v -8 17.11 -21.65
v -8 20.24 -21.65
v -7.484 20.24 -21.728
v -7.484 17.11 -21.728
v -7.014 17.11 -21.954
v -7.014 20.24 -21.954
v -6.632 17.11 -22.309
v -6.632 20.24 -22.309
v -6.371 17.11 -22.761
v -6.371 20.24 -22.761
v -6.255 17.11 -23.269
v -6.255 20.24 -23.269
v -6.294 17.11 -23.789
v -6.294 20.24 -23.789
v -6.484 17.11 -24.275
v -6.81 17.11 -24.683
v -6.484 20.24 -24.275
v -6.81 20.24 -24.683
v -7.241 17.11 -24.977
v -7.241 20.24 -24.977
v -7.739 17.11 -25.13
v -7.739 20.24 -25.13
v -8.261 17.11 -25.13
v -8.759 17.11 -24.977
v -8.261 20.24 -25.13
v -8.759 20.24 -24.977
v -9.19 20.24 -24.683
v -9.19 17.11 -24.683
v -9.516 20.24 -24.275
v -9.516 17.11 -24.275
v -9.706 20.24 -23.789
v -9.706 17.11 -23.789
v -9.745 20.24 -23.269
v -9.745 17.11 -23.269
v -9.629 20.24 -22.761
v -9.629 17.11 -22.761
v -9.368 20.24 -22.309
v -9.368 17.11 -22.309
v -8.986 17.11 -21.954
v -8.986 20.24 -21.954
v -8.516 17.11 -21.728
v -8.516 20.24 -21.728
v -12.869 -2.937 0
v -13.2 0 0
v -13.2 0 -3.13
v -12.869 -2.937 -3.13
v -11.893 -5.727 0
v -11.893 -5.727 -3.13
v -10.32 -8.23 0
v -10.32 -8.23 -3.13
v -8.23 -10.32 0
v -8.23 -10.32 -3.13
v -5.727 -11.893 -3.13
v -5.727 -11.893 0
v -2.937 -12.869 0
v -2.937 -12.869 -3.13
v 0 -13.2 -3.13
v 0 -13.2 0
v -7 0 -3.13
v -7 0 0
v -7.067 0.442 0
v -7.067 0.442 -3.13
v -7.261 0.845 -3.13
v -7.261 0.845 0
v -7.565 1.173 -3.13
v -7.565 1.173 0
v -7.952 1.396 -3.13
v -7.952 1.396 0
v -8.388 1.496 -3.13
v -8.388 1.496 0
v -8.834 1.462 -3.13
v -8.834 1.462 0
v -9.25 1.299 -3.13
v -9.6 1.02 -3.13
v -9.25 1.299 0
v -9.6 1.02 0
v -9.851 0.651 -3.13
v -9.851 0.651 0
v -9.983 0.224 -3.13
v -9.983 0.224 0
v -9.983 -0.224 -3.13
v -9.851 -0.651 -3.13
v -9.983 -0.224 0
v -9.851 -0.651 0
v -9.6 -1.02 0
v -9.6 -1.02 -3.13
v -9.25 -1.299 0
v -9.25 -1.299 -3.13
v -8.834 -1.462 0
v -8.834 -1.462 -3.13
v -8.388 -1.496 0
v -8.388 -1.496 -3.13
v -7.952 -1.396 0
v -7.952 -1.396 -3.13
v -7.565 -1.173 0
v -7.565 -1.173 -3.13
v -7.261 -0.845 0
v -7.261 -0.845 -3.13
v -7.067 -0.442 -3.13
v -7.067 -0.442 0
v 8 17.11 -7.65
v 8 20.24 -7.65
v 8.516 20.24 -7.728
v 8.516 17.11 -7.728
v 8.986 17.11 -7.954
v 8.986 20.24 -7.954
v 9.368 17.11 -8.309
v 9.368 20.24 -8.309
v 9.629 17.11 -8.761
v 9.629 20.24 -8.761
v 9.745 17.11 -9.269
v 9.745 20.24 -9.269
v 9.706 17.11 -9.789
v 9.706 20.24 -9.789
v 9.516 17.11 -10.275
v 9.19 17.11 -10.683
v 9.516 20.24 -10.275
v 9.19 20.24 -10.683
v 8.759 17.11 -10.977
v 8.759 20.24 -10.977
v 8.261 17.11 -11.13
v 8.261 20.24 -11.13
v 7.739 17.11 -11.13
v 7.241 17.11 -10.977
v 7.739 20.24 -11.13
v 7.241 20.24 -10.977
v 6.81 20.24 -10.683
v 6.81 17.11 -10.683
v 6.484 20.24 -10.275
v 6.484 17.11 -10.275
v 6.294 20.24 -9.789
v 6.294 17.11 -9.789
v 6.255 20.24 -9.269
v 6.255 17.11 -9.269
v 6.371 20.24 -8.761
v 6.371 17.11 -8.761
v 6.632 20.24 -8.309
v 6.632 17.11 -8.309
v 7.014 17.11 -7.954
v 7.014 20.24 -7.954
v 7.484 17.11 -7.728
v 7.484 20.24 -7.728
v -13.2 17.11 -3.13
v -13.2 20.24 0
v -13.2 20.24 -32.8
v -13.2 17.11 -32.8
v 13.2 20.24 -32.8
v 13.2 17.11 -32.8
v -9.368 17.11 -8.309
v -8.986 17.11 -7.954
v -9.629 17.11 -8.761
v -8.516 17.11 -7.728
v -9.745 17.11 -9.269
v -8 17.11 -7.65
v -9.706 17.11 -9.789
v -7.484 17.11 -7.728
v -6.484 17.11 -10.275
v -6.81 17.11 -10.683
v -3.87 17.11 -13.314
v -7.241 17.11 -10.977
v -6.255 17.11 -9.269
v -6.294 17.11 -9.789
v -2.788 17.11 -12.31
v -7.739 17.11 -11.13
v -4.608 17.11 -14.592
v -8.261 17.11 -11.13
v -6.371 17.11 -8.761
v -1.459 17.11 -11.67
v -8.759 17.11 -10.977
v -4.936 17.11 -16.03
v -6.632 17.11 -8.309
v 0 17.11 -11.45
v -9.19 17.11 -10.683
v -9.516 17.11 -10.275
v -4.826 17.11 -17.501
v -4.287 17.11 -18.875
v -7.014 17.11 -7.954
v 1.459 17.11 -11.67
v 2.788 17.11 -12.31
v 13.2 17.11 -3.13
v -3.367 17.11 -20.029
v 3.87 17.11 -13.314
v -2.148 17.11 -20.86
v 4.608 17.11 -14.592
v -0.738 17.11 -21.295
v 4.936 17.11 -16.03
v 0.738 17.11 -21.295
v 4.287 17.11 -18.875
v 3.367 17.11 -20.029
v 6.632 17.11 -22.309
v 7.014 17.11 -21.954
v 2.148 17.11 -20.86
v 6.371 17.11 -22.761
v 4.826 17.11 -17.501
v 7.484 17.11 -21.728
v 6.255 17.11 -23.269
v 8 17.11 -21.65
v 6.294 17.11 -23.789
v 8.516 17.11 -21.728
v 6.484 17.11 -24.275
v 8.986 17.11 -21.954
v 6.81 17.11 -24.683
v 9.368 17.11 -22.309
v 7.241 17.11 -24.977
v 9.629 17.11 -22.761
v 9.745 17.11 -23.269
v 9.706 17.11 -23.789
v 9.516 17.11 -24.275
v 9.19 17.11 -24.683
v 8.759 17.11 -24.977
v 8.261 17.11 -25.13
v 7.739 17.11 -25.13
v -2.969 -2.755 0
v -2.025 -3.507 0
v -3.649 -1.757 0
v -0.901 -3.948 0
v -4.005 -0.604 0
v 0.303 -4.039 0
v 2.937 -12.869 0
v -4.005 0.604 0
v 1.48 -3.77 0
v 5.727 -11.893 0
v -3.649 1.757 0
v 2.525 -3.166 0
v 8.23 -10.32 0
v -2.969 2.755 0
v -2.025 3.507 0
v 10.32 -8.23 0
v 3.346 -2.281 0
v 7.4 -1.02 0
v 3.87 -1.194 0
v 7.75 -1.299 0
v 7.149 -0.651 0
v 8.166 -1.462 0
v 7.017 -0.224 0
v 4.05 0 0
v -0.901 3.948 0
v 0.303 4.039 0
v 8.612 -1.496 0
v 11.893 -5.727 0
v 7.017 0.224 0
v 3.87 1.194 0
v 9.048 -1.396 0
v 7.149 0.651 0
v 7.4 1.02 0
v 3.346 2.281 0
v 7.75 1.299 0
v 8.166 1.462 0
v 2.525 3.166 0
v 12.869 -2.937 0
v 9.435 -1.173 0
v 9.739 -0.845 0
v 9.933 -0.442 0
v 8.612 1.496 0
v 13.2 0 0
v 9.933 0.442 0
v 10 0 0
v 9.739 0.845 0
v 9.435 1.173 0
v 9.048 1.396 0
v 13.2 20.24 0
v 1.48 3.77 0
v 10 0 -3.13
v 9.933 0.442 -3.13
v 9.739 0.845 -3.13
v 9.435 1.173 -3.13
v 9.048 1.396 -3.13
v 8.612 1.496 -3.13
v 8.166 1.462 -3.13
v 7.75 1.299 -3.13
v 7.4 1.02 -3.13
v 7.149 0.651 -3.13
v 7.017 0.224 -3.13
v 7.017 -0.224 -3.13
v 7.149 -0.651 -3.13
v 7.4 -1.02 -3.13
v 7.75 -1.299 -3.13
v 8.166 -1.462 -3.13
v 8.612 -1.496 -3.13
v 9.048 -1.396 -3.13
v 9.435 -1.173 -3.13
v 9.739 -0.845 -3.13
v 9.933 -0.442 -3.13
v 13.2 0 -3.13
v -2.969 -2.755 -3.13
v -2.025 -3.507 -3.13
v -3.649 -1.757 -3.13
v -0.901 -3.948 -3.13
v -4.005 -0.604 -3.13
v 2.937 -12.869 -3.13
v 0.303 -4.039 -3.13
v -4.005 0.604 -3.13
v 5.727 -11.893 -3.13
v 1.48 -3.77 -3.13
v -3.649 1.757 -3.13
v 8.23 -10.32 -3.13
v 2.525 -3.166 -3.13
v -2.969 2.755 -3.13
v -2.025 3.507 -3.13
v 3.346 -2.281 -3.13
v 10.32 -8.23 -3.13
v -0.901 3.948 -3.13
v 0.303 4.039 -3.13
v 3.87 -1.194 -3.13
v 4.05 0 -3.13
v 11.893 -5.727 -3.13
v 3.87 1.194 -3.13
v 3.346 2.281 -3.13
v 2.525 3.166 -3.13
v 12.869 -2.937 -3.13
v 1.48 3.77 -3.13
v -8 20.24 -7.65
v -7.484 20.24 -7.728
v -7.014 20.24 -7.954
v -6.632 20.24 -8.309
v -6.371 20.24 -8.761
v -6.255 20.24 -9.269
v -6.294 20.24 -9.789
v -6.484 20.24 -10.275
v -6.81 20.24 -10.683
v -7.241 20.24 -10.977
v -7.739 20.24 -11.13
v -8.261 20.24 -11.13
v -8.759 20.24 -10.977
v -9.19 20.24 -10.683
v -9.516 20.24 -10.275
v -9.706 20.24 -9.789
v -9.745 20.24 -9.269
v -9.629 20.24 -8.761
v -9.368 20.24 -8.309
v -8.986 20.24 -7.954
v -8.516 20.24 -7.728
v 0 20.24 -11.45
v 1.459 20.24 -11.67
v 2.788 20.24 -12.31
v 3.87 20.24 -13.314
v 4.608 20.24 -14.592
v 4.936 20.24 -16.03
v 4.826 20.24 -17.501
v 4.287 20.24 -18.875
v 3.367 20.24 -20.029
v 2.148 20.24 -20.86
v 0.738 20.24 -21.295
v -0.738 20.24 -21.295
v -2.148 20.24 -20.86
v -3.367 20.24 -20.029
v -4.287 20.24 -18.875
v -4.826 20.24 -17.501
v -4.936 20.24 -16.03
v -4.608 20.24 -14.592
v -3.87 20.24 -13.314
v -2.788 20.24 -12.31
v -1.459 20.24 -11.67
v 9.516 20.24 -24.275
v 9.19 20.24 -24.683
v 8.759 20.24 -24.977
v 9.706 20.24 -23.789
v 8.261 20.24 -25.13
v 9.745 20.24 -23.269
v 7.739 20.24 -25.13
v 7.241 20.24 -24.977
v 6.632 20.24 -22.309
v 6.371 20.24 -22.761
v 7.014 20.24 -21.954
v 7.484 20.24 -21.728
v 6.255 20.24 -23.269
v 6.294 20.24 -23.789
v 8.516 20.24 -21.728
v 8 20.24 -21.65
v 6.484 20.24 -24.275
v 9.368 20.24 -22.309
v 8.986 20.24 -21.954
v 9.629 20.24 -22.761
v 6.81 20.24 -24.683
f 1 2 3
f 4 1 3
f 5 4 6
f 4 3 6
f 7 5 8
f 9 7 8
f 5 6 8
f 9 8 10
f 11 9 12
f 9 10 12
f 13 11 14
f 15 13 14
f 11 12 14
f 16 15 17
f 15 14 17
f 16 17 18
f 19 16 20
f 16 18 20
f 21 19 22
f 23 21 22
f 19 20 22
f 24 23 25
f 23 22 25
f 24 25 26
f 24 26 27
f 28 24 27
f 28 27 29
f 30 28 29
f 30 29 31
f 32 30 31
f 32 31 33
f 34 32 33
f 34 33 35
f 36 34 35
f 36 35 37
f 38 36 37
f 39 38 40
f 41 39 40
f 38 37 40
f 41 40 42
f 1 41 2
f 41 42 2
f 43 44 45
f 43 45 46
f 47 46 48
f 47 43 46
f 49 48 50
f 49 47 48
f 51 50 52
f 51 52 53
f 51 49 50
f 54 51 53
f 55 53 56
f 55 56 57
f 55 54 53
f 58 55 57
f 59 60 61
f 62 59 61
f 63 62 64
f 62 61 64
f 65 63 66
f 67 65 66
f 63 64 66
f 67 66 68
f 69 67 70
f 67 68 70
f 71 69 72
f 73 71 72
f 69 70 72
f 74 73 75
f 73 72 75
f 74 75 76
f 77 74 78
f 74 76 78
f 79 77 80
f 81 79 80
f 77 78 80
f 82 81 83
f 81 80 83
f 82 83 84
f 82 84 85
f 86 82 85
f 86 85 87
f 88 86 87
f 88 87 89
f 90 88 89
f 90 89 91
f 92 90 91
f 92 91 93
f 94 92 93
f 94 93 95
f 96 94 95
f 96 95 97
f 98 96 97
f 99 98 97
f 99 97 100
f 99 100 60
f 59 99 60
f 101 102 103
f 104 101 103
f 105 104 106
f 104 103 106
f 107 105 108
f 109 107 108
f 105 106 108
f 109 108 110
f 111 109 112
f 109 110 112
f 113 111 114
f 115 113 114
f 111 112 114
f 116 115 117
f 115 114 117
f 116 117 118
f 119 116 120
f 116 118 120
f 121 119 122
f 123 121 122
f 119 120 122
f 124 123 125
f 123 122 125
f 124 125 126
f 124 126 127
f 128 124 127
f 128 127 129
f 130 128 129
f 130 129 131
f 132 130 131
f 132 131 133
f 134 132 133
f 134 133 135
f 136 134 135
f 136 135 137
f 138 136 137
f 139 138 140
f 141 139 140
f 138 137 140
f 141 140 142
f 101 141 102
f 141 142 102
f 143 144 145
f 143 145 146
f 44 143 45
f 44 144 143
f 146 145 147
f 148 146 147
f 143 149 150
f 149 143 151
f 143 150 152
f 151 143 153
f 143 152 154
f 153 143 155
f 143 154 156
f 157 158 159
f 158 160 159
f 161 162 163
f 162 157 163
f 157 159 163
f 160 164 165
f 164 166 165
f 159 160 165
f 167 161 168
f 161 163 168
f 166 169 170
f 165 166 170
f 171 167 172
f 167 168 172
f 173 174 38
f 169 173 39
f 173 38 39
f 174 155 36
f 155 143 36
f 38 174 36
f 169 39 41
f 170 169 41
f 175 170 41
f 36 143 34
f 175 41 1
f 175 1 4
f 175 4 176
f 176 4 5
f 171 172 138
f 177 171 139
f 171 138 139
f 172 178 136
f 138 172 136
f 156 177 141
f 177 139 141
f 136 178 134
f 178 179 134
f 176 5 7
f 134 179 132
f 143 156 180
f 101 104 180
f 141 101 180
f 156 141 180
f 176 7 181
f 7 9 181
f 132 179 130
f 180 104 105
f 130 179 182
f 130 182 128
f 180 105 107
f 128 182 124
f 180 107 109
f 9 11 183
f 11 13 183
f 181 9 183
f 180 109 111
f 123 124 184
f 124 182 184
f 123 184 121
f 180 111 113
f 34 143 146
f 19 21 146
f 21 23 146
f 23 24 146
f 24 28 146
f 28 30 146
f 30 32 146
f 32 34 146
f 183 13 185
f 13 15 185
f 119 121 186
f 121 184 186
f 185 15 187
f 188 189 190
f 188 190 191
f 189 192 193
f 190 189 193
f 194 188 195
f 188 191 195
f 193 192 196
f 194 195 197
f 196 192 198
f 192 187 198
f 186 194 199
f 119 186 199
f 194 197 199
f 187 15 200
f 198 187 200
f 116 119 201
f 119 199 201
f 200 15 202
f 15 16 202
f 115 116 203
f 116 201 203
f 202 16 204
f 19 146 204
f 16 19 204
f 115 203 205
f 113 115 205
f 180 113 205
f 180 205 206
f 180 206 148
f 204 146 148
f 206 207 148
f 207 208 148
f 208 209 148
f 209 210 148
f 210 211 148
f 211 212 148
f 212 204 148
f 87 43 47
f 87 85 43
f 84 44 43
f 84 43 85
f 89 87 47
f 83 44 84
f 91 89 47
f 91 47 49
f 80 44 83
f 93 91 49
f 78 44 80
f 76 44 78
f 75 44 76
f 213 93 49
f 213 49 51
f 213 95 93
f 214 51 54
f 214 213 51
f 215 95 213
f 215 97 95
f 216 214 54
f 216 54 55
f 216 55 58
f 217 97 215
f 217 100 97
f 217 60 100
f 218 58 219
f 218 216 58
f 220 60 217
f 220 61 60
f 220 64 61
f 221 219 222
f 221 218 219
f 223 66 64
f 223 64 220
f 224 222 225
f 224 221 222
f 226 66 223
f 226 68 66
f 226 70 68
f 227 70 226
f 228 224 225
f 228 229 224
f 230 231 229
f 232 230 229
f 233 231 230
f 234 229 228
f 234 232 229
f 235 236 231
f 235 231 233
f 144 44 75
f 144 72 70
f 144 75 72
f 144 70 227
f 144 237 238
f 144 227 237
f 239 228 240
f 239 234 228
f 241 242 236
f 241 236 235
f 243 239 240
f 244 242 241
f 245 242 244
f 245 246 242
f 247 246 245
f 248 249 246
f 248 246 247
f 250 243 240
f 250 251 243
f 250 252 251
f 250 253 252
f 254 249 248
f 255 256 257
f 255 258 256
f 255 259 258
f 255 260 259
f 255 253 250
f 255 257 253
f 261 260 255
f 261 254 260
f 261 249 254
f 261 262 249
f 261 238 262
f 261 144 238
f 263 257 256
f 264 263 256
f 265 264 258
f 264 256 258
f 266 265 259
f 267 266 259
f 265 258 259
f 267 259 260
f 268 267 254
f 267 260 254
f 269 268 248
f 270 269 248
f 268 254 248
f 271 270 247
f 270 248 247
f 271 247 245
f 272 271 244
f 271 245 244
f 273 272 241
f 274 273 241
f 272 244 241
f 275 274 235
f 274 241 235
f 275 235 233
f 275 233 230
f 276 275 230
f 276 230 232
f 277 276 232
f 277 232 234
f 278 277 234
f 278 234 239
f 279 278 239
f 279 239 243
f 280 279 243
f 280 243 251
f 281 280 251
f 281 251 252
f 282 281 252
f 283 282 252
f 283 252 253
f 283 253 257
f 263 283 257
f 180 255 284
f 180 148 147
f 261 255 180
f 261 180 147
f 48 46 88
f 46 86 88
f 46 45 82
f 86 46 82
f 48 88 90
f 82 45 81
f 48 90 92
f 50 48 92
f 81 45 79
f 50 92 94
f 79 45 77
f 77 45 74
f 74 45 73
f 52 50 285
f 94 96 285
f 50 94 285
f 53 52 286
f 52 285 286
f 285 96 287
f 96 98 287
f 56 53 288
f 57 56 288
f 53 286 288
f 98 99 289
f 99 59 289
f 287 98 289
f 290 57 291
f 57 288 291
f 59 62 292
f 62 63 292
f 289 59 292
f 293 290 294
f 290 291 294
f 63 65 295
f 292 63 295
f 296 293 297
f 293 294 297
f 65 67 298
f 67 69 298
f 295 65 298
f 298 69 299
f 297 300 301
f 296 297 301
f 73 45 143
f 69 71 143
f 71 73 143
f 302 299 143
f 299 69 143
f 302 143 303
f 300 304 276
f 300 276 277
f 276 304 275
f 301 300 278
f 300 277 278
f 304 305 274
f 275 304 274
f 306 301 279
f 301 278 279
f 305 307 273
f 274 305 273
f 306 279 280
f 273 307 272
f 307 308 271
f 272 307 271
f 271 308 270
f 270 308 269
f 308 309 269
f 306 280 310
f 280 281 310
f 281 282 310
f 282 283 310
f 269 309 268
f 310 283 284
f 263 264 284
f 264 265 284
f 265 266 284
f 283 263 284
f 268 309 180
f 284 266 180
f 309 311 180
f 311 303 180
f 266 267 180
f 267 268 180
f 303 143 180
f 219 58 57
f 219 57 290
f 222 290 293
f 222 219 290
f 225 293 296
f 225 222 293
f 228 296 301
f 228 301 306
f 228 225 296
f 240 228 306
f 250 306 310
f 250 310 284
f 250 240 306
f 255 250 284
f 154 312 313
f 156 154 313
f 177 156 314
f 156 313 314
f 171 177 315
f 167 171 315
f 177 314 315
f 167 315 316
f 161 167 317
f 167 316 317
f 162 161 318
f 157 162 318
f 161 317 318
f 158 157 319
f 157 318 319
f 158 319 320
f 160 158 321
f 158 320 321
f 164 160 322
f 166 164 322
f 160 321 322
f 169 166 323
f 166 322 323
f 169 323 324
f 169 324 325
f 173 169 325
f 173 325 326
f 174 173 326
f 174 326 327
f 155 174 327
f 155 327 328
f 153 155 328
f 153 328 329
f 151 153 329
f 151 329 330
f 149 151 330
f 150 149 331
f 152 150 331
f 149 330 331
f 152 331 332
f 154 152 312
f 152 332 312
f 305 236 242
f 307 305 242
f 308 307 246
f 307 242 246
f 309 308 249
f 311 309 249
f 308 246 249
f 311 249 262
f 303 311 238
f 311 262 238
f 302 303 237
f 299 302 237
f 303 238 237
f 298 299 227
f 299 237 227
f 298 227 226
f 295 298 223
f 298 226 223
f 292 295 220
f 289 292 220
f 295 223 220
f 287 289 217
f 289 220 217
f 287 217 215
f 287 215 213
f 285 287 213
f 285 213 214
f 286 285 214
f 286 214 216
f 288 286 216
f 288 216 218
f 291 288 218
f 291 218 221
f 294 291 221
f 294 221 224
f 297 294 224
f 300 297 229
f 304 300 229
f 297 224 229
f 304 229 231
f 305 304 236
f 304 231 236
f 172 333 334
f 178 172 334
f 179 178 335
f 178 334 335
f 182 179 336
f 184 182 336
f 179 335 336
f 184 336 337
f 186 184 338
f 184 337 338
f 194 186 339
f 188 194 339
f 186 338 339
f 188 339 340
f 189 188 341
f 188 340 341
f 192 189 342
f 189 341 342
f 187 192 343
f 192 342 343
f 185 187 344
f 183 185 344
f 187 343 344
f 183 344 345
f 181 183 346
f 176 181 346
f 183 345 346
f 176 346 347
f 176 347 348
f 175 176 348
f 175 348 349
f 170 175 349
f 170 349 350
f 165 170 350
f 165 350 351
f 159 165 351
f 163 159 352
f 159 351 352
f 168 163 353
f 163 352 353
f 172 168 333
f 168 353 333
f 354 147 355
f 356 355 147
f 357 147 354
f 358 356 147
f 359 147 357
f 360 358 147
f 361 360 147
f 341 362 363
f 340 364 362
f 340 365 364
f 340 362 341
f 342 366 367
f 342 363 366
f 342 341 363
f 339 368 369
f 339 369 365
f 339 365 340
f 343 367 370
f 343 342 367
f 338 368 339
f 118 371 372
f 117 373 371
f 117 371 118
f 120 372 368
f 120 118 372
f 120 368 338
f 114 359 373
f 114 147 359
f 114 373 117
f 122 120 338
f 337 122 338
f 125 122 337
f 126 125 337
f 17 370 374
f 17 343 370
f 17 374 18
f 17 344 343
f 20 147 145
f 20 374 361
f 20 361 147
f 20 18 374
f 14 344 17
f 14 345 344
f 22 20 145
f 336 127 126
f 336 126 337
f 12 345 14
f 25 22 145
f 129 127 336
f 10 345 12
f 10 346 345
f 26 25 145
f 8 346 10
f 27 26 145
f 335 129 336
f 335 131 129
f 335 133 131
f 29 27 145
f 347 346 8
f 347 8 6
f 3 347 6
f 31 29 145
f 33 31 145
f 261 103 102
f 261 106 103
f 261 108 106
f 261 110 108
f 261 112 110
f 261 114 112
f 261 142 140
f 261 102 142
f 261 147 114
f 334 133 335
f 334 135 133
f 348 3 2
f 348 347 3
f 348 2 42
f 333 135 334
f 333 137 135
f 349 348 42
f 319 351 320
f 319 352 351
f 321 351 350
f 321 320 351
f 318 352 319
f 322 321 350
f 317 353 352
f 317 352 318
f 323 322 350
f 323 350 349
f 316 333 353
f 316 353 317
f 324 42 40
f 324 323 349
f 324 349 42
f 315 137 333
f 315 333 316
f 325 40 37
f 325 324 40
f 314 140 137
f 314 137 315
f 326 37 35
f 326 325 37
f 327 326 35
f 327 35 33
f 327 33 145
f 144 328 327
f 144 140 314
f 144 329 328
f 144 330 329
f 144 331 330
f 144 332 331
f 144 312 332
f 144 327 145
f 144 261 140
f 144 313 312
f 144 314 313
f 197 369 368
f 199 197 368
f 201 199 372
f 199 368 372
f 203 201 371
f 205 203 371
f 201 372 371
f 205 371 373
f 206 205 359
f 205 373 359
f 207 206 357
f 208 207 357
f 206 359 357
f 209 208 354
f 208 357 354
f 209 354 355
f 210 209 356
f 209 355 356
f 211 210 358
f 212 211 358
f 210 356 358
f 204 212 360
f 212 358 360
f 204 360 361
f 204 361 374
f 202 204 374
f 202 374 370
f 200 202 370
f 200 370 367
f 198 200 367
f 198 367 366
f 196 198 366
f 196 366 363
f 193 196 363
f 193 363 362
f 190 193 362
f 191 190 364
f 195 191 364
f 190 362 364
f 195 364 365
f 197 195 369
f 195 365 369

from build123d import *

# Parameters (mm, degrees)
BOSS_EXTRUDE1_DEPTH = 3.13
SKETCH2_R           = 4.05
CUT_EXTRUDE1_DEPTH  = 3.13
SKETCH3_R           = 1.5
CUT_EXTRUDE2_DEPTH  = 17
SKETCH4_W           = 26.4
SKETCH4_H           = 32.8
BOSS_EXTRUDE2_DEPTH = 3.13
SKETCH5_R           = 4.95
CUT_EXTRUDE3_DEPTH  = 3.13
SKETCH6_R           = 1.75
CUT_EXTRUDE4_DEPTH  = 3.13


with BuildPart() as part:
    # Sketch1 → Boss-Extrude1 (new body)
    with BuildSketch(Plane.XY):
        with BuildLine():
            Line((-13.2, 20.24), (-13.2, 0))
            ThreePointArc((-13.2, 0), (0, 13.2), (13.2, 0))
            Line((13.2, 0), (13.2, 20.24))
            Line((13.2, 20.24), (-13.2, 20.24))
        make_face()
        with BuildLine():
            Line((-13.2, 0), (0, 0))
            Line((0, 0), (13.2, 0))
            ThreePointArc((13.2, 0), (0, 13.2), (-13.2, 0))
        make_face()
        with BuildLine():
            Line((13.2, 0), (0, 0))
            Line((0, 0), (0, -13.2))
            ThreePointArc((0, -13.2), (9.333809512, -9.333809512), (13.2, 0))
        make_face()
        with BuildLine():
            Line((0, -13.2), (0, 0))
            Line((0, 0), (-13.2, 0))
            ThreePointArc((-13.2, 0), (-9.333809512, -9.333809512), (0, -13.2))
        make_face()
    extrude(amount=-BOSS_EXTRUDE1_DEPTH)

    # Sketch2 → Cut-Extrude1 (cut)
    with BuildSketch(Plane.XY):
        Circle(SKETCH2_R)
    extrude(amount=-CUT_EXTRUDE1_DEPTH, mode=Mode.SUBTRACT)

    # Sketch3 → Cut-Extrude2 (cut)
    with BuildSketch(Plane.XY):
        with Locations((8.5, 0)):
            Circle(SKETCH3_R)
        with Locations((-8.5, 0)):
            Circle(SKETCH3_R)
    extrude(amount=-CUT_EXTRUDE2_DEPTH, mode=Mode.SUBTRACT)

    # Sketch4 → Boss-Extrude2 (add)
    with BuildSketch(Plane(origin=(0, 20.24, 0), x_dir=(1, 0, 0), z_dir=(0, 1, 0))):
        with Locations((0, 16.4)):
            Rectangle(SKETCH4_W, SKETCH4_H)
    extrude(amount=-BOSS_EXTRUDE2_DEPTH)

    # Sketch5 → Cut-Extrude3 (cut)
    with BuildSketch(Plane(origin=(0, 20.24, 0), x_dir=(1, 0, 0), z_dir=(0, 1, 0))):
        with Locations(Location((0, 16.4, 0), (0, 0, 270))):
            Circle(SKETCH5_R)
    extrude(amount=-CUT_EXTRUDE3_DEPTH, mode=Mode.SUBTRACT)

    # Sketch6 → Cut-Extrude4 (cut)
    with BuildSketch(Plane(origin=(0, 20.24, 0), x_dir=(1, 0, 0), z_dir=(0, 1, 0))):
        with Locations(Location((8, 23.4, 0), (0, 0, 270))):
            Circle(SKETCH6_R)
        with Locations(Location((8, 9.4, 0), (0, 0, 270))):
            Circle(SKETCH6_R)
        with Locations(Location((-8, 9.4, 0), (0, 0, 270))):
            Circle(SKETCH6_R)
        with Locations(Location((-8, 23.4, 0), (0, 0, 270))):
            Circle(SKETCH6_R)
    extrude(amount=-CUT_EXTRUDE4_DEPTH, mode=Mode.SUBTRACT)


solid = part.part
